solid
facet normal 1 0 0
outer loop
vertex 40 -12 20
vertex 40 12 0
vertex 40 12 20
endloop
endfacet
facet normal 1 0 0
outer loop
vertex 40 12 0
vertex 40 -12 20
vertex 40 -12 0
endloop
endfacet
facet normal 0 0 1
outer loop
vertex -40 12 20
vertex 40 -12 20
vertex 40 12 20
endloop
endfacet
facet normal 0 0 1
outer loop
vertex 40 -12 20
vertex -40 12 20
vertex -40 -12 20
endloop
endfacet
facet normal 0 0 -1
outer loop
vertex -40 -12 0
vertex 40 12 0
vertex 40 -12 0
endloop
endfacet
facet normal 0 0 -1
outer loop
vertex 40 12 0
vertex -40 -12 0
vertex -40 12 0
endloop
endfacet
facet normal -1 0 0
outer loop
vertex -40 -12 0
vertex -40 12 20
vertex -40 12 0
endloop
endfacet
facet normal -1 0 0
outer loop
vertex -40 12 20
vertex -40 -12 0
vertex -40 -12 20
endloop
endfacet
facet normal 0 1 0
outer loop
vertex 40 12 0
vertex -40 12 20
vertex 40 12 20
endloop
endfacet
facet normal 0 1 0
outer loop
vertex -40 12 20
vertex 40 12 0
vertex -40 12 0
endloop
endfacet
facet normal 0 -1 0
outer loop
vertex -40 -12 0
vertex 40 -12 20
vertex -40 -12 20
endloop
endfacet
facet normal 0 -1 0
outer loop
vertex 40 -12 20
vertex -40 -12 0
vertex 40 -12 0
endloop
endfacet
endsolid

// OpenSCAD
// Built by bench/smallmodels/features/compiler.py from a list of features.
$fn = 64;
difference() {
  union() {
    translate([0, 0, 0]) translate([-40, -12, 0]) cube([80, 24, 20]);
  }
  union() {
    translate([0, -36.5, 7.99]) rotate([0, 0, 0]) cylinder(d = 6.4, h = 12.02);
  }
}
